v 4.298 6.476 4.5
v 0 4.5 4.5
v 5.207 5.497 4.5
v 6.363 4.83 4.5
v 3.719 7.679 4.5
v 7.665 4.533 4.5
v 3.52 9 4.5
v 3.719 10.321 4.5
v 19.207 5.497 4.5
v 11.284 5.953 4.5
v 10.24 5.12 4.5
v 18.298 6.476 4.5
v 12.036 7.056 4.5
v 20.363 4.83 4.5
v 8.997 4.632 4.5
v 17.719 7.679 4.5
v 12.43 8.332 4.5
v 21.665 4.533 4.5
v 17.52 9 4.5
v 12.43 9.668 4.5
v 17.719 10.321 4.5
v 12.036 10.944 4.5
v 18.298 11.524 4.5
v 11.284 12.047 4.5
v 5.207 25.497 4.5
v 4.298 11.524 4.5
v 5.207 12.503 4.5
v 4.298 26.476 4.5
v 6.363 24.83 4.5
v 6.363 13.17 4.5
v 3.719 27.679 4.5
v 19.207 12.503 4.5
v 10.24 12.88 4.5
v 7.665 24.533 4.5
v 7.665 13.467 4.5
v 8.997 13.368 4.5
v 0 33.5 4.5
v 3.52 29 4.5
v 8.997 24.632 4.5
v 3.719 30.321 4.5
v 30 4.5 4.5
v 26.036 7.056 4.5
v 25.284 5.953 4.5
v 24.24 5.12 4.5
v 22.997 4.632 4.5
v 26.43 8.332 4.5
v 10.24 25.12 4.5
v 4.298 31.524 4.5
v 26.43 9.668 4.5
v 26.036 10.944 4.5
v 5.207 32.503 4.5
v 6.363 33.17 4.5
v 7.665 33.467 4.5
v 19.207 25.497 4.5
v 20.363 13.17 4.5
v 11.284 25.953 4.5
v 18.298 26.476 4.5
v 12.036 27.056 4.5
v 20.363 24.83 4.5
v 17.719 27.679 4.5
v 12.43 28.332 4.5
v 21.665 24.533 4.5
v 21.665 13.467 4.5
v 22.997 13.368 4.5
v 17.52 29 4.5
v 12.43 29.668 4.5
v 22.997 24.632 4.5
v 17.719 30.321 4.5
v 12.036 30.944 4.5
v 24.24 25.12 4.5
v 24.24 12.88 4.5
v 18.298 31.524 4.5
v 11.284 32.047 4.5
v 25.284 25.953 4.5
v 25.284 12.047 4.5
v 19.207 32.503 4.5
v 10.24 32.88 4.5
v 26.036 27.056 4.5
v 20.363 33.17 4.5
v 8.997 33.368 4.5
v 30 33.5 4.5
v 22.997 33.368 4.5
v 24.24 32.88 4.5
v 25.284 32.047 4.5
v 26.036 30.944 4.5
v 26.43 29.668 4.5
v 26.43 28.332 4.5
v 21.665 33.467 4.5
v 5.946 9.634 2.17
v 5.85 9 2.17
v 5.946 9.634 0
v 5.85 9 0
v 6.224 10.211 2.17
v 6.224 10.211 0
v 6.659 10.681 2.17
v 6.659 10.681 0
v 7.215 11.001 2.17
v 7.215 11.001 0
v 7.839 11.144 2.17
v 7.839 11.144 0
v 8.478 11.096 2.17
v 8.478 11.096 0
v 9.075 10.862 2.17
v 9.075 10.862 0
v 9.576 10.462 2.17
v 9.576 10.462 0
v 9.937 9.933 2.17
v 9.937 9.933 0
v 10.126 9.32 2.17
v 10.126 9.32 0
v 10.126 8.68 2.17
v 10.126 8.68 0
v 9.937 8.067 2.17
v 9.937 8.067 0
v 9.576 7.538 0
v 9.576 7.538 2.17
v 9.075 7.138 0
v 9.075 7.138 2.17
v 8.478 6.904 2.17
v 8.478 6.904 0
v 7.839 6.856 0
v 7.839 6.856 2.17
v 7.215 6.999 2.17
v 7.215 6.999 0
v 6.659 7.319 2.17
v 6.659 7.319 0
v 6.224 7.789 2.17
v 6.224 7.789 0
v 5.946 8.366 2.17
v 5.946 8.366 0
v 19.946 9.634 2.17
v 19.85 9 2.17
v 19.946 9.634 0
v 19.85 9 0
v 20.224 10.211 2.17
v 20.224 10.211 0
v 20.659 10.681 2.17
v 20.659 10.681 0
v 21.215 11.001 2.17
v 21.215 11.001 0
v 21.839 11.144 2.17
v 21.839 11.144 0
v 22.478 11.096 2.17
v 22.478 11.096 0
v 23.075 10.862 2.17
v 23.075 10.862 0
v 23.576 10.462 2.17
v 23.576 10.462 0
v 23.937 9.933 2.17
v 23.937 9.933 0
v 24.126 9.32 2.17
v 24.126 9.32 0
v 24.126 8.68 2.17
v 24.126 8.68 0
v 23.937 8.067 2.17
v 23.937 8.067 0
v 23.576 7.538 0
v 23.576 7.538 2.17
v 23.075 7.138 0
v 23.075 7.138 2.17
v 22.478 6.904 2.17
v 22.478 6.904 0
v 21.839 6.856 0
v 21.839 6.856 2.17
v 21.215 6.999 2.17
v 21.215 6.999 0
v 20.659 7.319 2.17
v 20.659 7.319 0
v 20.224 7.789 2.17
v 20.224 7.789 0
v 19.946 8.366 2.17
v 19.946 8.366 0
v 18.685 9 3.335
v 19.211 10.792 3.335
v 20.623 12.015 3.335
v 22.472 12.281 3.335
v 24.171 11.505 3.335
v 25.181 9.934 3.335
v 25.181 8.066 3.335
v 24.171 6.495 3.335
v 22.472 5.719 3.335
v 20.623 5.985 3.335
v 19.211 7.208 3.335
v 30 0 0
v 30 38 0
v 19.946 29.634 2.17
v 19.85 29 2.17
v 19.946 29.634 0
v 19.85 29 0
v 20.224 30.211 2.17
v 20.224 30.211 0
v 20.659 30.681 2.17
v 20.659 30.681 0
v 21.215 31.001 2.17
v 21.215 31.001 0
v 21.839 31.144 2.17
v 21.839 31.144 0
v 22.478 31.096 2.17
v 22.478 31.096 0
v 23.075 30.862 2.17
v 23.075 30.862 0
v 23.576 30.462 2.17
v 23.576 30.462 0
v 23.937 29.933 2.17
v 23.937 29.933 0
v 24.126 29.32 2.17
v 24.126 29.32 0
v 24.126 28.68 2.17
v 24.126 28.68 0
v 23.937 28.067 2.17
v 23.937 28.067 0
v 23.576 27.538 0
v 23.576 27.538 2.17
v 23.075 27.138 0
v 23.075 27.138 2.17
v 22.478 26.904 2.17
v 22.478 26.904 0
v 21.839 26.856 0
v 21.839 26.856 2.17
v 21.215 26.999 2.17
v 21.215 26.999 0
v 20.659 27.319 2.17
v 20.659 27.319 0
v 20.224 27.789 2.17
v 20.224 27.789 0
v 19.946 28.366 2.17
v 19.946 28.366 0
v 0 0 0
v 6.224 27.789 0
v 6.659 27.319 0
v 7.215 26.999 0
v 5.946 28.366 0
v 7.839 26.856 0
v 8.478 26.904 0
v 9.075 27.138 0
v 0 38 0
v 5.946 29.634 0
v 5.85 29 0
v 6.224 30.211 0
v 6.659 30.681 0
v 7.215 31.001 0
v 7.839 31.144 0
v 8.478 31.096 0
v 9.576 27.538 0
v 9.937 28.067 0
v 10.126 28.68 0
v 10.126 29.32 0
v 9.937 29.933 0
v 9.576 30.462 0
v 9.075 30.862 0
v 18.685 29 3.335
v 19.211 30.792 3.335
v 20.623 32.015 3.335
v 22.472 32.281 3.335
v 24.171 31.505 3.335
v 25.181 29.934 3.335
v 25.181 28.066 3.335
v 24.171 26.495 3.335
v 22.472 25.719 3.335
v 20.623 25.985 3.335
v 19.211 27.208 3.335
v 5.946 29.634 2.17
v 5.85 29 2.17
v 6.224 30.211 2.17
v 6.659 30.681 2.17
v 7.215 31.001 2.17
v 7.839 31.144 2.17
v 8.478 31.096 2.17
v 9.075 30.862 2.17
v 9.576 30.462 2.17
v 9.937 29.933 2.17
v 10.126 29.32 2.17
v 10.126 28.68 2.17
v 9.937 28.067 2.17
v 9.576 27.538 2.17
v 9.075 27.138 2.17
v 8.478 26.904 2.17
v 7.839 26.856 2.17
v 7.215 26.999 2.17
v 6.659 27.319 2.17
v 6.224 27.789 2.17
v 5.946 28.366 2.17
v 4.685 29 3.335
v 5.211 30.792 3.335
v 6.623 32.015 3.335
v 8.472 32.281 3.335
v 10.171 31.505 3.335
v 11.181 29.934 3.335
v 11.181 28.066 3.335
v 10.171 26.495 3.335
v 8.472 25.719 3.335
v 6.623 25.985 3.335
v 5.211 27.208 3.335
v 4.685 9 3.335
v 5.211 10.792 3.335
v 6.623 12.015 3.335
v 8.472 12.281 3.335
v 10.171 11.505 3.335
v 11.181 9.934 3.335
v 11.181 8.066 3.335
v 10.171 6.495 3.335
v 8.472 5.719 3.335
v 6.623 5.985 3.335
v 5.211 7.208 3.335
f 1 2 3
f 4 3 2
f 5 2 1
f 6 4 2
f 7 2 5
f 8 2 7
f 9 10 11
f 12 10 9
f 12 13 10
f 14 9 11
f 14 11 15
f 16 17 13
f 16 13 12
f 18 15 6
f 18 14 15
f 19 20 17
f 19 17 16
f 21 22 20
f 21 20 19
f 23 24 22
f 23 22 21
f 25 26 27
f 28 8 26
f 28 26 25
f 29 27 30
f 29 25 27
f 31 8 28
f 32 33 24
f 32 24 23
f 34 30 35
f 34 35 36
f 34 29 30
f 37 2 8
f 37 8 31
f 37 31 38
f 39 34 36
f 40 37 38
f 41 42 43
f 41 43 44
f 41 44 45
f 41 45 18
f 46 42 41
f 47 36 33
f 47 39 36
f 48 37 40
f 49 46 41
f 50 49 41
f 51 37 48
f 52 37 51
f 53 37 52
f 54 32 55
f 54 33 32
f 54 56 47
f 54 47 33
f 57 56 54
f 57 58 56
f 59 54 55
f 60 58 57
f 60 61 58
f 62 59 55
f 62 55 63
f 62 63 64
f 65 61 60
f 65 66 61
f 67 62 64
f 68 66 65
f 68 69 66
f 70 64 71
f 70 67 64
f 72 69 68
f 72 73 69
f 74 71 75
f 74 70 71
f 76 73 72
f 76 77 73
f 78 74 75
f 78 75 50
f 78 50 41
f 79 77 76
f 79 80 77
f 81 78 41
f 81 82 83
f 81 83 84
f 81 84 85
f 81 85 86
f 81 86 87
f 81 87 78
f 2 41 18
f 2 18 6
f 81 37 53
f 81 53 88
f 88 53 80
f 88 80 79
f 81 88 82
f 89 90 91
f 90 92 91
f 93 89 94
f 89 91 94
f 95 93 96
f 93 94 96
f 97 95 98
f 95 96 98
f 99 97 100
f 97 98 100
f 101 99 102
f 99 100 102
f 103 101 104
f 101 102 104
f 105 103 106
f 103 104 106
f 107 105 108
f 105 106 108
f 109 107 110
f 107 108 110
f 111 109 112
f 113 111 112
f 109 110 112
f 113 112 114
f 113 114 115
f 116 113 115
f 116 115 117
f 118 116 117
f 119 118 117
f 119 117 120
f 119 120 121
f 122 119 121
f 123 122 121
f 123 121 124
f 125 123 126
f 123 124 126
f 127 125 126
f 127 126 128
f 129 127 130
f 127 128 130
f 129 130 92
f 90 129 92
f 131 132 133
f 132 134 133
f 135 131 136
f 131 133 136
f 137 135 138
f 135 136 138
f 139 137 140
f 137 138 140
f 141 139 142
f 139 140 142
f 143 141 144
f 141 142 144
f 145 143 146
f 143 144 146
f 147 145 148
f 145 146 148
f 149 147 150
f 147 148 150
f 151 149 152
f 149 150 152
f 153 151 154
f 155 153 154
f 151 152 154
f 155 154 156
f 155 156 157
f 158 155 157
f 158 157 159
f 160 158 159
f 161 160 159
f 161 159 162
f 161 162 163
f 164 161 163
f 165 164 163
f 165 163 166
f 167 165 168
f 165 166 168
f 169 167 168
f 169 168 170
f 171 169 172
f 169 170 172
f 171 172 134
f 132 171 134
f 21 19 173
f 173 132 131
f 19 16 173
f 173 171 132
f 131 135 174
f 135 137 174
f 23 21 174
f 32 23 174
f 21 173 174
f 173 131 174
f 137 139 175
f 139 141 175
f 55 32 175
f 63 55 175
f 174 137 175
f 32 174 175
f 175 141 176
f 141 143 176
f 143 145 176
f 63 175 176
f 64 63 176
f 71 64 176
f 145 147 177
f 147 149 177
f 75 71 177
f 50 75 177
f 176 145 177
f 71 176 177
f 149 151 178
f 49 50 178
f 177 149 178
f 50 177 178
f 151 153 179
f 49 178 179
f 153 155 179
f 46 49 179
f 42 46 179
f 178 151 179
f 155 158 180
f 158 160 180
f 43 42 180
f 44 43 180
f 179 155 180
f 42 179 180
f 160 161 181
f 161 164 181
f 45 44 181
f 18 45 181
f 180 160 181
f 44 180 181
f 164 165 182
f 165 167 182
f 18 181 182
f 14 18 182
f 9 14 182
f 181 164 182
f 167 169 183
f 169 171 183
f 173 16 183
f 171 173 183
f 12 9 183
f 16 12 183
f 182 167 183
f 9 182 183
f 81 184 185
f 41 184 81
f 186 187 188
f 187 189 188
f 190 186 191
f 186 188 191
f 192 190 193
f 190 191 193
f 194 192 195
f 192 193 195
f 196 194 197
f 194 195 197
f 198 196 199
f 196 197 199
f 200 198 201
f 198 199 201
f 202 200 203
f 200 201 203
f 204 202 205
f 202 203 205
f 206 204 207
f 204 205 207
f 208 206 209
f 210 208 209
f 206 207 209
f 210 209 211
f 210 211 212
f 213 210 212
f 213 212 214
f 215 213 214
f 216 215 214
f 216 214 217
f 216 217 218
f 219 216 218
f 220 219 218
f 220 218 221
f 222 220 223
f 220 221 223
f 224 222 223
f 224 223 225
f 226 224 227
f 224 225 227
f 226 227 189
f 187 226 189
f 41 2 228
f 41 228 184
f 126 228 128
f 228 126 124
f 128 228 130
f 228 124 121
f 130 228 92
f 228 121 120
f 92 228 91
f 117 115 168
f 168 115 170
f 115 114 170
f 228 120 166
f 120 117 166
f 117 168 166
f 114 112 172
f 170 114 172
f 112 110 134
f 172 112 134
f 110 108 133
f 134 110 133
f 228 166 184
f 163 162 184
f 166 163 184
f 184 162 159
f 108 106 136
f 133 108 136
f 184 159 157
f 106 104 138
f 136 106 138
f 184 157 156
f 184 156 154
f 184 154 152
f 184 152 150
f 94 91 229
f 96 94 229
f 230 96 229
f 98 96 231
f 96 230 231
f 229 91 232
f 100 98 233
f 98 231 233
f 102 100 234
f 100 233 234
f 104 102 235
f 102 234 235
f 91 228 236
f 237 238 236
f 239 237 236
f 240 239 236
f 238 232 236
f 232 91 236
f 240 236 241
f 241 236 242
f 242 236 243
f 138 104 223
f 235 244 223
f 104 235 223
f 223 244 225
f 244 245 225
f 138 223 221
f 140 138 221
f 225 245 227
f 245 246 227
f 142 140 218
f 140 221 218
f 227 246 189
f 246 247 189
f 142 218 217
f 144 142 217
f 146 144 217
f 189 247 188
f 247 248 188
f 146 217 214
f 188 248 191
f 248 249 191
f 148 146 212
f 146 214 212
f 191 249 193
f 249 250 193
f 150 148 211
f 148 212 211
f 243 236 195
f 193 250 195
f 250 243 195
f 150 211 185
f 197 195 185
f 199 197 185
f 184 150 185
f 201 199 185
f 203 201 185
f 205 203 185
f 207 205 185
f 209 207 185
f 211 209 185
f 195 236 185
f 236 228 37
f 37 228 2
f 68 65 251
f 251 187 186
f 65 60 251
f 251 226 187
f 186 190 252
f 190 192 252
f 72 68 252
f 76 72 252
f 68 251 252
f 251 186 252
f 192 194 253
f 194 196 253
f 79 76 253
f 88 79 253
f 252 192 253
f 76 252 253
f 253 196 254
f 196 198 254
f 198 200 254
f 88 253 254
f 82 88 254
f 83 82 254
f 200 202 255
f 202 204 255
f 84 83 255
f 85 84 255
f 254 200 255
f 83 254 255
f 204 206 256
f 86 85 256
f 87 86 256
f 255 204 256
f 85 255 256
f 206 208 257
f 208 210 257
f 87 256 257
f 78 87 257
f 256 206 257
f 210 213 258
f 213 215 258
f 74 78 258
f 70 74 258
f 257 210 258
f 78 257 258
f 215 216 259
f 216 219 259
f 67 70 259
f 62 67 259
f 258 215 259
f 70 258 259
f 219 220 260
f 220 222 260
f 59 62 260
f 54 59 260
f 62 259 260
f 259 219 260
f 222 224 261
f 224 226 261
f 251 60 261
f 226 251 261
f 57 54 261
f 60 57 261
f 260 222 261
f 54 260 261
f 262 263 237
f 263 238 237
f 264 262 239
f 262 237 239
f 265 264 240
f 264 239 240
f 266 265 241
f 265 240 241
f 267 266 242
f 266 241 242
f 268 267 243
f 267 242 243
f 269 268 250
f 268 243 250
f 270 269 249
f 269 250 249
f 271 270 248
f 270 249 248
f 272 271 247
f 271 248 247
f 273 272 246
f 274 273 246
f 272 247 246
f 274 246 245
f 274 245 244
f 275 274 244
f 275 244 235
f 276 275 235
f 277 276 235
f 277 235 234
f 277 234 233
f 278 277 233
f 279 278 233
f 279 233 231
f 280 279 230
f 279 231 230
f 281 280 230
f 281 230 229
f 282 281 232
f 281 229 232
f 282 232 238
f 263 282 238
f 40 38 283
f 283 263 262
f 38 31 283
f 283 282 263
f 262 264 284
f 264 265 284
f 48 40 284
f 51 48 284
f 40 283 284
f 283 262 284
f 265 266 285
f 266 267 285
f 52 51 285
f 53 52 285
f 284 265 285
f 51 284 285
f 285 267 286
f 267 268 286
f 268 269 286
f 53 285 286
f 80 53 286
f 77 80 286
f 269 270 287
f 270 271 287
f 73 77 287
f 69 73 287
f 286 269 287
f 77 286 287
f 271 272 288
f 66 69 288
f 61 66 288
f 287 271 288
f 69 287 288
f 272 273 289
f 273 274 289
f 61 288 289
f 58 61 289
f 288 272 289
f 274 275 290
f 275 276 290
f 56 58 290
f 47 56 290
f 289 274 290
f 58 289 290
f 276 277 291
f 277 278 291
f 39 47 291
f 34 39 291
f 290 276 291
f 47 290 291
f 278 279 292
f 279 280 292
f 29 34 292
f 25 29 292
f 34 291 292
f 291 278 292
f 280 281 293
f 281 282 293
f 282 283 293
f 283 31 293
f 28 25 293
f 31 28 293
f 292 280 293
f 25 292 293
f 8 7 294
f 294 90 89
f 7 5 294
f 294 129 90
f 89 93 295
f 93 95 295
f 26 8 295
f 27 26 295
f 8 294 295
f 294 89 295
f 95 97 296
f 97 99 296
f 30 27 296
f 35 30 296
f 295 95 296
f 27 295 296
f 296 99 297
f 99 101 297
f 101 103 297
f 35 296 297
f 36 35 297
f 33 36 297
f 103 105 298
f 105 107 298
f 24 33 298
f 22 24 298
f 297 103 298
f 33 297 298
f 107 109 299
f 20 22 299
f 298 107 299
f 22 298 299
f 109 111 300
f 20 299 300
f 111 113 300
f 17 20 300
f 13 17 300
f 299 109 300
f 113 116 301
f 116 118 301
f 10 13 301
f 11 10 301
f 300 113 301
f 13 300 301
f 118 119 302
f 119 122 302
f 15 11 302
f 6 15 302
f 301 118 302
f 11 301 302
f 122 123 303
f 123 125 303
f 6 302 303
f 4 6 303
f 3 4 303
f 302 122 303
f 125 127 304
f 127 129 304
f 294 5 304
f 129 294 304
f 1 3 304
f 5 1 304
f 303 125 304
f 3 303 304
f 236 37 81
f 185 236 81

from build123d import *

# Parameters (mm, degrees)
SKETCH_1_W                   = 30
SKETCH_1_H                   = 38
EXTRUDE_1_DEPTH              = 4.5
CHAMFER_1_SIZE               = 4.5
HOLE_WIZARD_M4_1_D           = 4.3
HOLE_WIZARD_M4_1_CSINK_D     = 8.96
HOLE_WIZARD_M4_1_CSINK_ANGLE = 90


with BuildPart() as part:
    # 草图1 → 凸台-拉伸1 (new body)
    with BuildSketch(Plane.XY):
        with Locations((15, 19)):
            Rectangle(SKETCH_1_W, SKETCH_1_H)
    extrude(amount=EXTRUDE_1_DEPTH)

    # 倒角1
    chamfer_1_edges = [part.edges().sort_by_distance(p)[0] for p in [
        (15, 0, 4.5),
        (15, 38, 4.5),
    ]]
    chamfer(chamfer_1_edges, length=CHAMFER_1_SIZE - 0.0001)  # a hair under: the kernel refuses the full size

    # M4 六角凹锥坑螺钉的锥形沉头孔1 (through all)
    with Locations(Plane.XY.offset(4.5)):
        with Locations((8, 9), (8, 29), (22, 29), (22, 9)):
            CounterSinkHole(HOLE_WIZARD_M4_1_D / 2, HOLE_WIZARD_M4_1_CSINK_D / 2, counter_sink_angle=HOLE_WIZARD_M4_1_CSINK_ANGLE)


solid = part.part
